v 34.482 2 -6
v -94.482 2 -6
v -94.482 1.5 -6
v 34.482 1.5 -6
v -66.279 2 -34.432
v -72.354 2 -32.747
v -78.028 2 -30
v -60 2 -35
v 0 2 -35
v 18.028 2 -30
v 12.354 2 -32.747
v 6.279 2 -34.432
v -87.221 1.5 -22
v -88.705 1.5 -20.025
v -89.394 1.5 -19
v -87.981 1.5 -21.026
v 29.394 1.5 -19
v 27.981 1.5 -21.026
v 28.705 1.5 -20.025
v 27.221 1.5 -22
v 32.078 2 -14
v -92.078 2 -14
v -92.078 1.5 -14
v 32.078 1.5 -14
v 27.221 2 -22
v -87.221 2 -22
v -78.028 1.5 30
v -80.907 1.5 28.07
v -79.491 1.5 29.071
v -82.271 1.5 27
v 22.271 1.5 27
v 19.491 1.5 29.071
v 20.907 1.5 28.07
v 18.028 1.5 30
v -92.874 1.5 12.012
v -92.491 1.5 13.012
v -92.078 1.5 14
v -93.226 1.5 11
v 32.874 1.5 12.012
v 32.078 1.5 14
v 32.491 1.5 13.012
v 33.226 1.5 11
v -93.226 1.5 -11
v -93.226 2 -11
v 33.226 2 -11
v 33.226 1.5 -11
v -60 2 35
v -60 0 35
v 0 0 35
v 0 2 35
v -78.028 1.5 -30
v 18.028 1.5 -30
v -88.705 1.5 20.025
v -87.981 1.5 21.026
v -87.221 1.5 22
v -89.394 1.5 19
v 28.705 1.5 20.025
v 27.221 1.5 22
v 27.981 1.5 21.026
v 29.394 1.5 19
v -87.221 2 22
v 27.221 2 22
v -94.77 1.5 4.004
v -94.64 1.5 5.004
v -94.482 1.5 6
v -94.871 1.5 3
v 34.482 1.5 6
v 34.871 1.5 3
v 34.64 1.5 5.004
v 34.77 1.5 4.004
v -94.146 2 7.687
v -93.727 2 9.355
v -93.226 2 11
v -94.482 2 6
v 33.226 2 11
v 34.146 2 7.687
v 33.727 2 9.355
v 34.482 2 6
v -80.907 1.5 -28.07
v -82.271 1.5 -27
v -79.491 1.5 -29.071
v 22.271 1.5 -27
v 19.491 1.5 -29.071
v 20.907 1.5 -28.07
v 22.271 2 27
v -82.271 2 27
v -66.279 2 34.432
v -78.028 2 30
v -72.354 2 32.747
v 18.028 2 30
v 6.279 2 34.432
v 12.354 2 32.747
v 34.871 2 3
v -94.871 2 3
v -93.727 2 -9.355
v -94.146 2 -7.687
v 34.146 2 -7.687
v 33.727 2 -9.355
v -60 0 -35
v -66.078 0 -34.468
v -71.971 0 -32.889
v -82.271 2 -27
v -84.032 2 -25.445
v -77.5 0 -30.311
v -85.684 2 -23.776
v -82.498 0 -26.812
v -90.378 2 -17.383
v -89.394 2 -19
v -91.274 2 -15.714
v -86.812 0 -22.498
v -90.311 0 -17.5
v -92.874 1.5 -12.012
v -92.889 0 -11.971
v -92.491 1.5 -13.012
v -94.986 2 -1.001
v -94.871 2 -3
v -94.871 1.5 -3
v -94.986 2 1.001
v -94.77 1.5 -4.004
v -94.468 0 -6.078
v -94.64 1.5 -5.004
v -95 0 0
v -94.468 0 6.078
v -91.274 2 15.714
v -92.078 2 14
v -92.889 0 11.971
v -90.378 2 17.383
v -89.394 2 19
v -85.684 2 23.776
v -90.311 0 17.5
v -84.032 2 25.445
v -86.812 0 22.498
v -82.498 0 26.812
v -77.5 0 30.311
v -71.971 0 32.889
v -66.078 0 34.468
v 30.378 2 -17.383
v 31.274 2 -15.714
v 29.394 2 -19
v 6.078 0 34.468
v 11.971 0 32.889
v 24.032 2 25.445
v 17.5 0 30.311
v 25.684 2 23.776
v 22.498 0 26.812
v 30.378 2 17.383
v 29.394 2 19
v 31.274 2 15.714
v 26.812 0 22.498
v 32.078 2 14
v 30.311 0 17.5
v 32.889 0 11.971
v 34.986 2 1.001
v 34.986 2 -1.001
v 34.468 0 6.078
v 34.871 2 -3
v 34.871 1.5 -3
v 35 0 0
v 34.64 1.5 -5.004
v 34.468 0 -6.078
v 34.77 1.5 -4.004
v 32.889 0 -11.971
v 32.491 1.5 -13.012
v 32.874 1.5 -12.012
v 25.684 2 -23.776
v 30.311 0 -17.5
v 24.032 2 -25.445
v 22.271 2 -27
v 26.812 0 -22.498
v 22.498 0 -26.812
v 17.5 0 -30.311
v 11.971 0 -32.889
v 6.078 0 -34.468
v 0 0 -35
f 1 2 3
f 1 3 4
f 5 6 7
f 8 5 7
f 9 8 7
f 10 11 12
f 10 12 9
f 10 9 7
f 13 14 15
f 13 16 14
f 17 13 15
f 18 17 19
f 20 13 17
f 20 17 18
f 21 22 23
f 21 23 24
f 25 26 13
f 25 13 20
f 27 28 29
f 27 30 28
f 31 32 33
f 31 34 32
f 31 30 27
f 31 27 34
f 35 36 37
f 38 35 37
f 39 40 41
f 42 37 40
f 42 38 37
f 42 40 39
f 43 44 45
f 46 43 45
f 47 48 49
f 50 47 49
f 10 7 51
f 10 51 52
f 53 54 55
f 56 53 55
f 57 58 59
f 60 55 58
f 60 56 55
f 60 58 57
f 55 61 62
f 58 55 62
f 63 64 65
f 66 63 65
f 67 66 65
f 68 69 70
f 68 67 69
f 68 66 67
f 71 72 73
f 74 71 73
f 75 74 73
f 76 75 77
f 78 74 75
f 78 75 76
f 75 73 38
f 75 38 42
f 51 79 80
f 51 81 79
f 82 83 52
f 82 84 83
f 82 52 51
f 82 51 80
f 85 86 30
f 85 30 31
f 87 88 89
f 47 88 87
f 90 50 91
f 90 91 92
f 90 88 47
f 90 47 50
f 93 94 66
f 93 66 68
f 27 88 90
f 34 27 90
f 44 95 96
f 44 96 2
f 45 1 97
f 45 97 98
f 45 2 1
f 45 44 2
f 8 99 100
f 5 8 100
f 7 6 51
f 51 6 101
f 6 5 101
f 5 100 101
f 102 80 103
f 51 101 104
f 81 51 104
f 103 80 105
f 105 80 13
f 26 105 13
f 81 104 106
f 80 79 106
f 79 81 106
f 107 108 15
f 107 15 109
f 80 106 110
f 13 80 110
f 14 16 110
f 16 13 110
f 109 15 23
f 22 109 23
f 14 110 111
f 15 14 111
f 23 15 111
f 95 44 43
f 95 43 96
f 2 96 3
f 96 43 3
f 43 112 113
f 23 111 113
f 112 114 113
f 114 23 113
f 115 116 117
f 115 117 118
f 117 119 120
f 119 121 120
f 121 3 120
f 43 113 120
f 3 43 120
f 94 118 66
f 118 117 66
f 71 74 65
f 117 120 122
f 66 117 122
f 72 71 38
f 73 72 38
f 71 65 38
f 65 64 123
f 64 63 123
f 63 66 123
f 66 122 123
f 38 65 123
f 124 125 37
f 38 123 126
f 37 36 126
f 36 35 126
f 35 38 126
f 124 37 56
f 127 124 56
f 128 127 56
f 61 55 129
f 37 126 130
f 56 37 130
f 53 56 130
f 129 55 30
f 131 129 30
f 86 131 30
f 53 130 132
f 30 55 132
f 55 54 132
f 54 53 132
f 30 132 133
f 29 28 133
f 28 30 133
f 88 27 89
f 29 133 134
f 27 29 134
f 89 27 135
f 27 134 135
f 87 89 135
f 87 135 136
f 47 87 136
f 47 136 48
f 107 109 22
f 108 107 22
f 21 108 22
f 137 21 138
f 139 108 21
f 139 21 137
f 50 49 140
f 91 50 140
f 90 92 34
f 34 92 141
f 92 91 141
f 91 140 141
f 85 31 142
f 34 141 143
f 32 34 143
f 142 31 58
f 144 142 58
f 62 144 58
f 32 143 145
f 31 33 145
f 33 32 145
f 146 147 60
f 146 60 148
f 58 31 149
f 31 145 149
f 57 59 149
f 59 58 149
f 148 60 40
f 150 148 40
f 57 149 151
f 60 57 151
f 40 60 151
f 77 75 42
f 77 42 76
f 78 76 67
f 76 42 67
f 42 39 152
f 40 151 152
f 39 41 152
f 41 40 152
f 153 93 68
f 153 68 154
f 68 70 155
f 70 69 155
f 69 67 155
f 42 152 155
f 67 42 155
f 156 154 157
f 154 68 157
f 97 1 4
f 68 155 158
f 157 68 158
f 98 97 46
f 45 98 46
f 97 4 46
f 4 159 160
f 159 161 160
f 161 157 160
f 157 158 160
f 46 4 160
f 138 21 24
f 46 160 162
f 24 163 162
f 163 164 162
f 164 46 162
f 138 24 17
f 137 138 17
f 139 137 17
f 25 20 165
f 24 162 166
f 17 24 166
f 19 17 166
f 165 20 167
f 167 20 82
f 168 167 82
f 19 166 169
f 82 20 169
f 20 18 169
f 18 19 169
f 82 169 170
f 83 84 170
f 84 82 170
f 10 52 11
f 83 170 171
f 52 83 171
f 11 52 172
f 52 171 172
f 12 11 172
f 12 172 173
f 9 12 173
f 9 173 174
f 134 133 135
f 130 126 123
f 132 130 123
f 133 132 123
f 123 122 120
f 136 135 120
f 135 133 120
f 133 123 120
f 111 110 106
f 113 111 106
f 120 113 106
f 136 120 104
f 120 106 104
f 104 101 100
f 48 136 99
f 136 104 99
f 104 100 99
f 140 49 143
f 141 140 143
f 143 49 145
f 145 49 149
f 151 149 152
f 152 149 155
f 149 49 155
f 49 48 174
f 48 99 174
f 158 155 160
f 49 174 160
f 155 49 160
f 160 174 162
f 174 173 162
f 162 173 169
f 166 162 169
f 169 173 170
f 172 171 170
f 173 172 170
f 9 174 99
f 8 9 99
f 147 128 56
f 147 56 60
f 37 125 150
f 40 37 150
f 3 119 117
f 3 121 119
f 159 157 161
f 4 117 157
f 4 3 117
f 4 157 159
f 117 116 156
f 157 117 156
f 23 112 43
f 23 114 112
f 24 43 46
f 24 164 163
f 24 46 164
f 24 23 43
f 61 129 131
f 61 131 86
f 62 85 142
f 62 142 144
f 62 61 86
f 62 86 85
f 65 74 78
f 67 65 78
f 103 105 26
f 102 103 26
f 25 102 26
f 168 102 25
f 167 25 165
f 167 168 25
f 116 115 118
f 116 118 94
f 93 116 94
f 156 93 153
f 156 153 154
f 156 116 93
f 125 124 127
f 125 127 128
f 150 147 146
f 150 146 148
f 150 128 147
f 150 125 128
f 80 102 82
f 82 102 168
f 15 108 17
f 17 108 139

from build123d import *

# Parameters (mm, degrees)
BOSS_EXTRUDE1_DEPTH = 2
SKETCH2_W           = 110.931662833
SKETCH2_H           = 3
SKETCH2_W_2         = 124.512387616
SKETCH2_W_3         = 131.50444394
SKETCH2_W_4         = 133.924771129
CUT_EXTRUDE1_DEPTH  = 0.5


with BuildPart() as part:
    # Sketch1 → Boss-Extrude1 (new body)
    with BuildSketch(Plane(origin=(0, 0, 0), x_dir=(1, 0, 0), z_dir=(0, 1, 0))):
        with BuildLine():
            Line((0, 35), (-60, 35))
            ThreePointArc((-60, 35), (-95, 0), (-60, -35))
            Line((-60, -35), (0, -35))
            ThreePointArc((0, -35), (35, 0), (0, 35))
        make_face()
    extrude(amount=BOSS_EXTRUDE1_DEPTH)

    # Sketch2 → Cut-Extrude1 (cut)
    with BuildSketch(Plane(origin=(0, 2, 0), x_dir=(1, 0, 0), z_dir=(0, 1, 0))):
        with Locations((-30.336156555, 28.5)):
            Rectangle(SKETCH2_W, SKETCH2_H)
        with Locations((-30, 20.5)):
            Rectangle(SKETCH2_W_2, SKETCH2_H)
        with Locations((-29.865537378, 12.5)):
            Rectangle(SKETCH2_W_3, SKETCH2_H)
        with Locations((-28.655373784, 4.5)):
            Rectangle(SKETCH2_W_4, SKETCH2_H)
        with Locations((-28.655373784, -4.5)):
            Rectangle(SKETCH2_W_4, SKETCH2_H)
        with Locations((-29.865537378, -12.5)):
            Rectangle(SKETCH2_W_3, SKETCH2_H)
        with Locations((-30, -20.5)):
            Rectangle(SKETCH2_W_2, SKETCH2_H)
        with Locations((-30.336156555, -28.5)):
            Rectangle(SKETCH2_W, SKETCH2_H)
    extrude(amount=-CUT_EXTRUDE1_DEPTH, mode=Mode.SUBTRACT)


solid = part.part
